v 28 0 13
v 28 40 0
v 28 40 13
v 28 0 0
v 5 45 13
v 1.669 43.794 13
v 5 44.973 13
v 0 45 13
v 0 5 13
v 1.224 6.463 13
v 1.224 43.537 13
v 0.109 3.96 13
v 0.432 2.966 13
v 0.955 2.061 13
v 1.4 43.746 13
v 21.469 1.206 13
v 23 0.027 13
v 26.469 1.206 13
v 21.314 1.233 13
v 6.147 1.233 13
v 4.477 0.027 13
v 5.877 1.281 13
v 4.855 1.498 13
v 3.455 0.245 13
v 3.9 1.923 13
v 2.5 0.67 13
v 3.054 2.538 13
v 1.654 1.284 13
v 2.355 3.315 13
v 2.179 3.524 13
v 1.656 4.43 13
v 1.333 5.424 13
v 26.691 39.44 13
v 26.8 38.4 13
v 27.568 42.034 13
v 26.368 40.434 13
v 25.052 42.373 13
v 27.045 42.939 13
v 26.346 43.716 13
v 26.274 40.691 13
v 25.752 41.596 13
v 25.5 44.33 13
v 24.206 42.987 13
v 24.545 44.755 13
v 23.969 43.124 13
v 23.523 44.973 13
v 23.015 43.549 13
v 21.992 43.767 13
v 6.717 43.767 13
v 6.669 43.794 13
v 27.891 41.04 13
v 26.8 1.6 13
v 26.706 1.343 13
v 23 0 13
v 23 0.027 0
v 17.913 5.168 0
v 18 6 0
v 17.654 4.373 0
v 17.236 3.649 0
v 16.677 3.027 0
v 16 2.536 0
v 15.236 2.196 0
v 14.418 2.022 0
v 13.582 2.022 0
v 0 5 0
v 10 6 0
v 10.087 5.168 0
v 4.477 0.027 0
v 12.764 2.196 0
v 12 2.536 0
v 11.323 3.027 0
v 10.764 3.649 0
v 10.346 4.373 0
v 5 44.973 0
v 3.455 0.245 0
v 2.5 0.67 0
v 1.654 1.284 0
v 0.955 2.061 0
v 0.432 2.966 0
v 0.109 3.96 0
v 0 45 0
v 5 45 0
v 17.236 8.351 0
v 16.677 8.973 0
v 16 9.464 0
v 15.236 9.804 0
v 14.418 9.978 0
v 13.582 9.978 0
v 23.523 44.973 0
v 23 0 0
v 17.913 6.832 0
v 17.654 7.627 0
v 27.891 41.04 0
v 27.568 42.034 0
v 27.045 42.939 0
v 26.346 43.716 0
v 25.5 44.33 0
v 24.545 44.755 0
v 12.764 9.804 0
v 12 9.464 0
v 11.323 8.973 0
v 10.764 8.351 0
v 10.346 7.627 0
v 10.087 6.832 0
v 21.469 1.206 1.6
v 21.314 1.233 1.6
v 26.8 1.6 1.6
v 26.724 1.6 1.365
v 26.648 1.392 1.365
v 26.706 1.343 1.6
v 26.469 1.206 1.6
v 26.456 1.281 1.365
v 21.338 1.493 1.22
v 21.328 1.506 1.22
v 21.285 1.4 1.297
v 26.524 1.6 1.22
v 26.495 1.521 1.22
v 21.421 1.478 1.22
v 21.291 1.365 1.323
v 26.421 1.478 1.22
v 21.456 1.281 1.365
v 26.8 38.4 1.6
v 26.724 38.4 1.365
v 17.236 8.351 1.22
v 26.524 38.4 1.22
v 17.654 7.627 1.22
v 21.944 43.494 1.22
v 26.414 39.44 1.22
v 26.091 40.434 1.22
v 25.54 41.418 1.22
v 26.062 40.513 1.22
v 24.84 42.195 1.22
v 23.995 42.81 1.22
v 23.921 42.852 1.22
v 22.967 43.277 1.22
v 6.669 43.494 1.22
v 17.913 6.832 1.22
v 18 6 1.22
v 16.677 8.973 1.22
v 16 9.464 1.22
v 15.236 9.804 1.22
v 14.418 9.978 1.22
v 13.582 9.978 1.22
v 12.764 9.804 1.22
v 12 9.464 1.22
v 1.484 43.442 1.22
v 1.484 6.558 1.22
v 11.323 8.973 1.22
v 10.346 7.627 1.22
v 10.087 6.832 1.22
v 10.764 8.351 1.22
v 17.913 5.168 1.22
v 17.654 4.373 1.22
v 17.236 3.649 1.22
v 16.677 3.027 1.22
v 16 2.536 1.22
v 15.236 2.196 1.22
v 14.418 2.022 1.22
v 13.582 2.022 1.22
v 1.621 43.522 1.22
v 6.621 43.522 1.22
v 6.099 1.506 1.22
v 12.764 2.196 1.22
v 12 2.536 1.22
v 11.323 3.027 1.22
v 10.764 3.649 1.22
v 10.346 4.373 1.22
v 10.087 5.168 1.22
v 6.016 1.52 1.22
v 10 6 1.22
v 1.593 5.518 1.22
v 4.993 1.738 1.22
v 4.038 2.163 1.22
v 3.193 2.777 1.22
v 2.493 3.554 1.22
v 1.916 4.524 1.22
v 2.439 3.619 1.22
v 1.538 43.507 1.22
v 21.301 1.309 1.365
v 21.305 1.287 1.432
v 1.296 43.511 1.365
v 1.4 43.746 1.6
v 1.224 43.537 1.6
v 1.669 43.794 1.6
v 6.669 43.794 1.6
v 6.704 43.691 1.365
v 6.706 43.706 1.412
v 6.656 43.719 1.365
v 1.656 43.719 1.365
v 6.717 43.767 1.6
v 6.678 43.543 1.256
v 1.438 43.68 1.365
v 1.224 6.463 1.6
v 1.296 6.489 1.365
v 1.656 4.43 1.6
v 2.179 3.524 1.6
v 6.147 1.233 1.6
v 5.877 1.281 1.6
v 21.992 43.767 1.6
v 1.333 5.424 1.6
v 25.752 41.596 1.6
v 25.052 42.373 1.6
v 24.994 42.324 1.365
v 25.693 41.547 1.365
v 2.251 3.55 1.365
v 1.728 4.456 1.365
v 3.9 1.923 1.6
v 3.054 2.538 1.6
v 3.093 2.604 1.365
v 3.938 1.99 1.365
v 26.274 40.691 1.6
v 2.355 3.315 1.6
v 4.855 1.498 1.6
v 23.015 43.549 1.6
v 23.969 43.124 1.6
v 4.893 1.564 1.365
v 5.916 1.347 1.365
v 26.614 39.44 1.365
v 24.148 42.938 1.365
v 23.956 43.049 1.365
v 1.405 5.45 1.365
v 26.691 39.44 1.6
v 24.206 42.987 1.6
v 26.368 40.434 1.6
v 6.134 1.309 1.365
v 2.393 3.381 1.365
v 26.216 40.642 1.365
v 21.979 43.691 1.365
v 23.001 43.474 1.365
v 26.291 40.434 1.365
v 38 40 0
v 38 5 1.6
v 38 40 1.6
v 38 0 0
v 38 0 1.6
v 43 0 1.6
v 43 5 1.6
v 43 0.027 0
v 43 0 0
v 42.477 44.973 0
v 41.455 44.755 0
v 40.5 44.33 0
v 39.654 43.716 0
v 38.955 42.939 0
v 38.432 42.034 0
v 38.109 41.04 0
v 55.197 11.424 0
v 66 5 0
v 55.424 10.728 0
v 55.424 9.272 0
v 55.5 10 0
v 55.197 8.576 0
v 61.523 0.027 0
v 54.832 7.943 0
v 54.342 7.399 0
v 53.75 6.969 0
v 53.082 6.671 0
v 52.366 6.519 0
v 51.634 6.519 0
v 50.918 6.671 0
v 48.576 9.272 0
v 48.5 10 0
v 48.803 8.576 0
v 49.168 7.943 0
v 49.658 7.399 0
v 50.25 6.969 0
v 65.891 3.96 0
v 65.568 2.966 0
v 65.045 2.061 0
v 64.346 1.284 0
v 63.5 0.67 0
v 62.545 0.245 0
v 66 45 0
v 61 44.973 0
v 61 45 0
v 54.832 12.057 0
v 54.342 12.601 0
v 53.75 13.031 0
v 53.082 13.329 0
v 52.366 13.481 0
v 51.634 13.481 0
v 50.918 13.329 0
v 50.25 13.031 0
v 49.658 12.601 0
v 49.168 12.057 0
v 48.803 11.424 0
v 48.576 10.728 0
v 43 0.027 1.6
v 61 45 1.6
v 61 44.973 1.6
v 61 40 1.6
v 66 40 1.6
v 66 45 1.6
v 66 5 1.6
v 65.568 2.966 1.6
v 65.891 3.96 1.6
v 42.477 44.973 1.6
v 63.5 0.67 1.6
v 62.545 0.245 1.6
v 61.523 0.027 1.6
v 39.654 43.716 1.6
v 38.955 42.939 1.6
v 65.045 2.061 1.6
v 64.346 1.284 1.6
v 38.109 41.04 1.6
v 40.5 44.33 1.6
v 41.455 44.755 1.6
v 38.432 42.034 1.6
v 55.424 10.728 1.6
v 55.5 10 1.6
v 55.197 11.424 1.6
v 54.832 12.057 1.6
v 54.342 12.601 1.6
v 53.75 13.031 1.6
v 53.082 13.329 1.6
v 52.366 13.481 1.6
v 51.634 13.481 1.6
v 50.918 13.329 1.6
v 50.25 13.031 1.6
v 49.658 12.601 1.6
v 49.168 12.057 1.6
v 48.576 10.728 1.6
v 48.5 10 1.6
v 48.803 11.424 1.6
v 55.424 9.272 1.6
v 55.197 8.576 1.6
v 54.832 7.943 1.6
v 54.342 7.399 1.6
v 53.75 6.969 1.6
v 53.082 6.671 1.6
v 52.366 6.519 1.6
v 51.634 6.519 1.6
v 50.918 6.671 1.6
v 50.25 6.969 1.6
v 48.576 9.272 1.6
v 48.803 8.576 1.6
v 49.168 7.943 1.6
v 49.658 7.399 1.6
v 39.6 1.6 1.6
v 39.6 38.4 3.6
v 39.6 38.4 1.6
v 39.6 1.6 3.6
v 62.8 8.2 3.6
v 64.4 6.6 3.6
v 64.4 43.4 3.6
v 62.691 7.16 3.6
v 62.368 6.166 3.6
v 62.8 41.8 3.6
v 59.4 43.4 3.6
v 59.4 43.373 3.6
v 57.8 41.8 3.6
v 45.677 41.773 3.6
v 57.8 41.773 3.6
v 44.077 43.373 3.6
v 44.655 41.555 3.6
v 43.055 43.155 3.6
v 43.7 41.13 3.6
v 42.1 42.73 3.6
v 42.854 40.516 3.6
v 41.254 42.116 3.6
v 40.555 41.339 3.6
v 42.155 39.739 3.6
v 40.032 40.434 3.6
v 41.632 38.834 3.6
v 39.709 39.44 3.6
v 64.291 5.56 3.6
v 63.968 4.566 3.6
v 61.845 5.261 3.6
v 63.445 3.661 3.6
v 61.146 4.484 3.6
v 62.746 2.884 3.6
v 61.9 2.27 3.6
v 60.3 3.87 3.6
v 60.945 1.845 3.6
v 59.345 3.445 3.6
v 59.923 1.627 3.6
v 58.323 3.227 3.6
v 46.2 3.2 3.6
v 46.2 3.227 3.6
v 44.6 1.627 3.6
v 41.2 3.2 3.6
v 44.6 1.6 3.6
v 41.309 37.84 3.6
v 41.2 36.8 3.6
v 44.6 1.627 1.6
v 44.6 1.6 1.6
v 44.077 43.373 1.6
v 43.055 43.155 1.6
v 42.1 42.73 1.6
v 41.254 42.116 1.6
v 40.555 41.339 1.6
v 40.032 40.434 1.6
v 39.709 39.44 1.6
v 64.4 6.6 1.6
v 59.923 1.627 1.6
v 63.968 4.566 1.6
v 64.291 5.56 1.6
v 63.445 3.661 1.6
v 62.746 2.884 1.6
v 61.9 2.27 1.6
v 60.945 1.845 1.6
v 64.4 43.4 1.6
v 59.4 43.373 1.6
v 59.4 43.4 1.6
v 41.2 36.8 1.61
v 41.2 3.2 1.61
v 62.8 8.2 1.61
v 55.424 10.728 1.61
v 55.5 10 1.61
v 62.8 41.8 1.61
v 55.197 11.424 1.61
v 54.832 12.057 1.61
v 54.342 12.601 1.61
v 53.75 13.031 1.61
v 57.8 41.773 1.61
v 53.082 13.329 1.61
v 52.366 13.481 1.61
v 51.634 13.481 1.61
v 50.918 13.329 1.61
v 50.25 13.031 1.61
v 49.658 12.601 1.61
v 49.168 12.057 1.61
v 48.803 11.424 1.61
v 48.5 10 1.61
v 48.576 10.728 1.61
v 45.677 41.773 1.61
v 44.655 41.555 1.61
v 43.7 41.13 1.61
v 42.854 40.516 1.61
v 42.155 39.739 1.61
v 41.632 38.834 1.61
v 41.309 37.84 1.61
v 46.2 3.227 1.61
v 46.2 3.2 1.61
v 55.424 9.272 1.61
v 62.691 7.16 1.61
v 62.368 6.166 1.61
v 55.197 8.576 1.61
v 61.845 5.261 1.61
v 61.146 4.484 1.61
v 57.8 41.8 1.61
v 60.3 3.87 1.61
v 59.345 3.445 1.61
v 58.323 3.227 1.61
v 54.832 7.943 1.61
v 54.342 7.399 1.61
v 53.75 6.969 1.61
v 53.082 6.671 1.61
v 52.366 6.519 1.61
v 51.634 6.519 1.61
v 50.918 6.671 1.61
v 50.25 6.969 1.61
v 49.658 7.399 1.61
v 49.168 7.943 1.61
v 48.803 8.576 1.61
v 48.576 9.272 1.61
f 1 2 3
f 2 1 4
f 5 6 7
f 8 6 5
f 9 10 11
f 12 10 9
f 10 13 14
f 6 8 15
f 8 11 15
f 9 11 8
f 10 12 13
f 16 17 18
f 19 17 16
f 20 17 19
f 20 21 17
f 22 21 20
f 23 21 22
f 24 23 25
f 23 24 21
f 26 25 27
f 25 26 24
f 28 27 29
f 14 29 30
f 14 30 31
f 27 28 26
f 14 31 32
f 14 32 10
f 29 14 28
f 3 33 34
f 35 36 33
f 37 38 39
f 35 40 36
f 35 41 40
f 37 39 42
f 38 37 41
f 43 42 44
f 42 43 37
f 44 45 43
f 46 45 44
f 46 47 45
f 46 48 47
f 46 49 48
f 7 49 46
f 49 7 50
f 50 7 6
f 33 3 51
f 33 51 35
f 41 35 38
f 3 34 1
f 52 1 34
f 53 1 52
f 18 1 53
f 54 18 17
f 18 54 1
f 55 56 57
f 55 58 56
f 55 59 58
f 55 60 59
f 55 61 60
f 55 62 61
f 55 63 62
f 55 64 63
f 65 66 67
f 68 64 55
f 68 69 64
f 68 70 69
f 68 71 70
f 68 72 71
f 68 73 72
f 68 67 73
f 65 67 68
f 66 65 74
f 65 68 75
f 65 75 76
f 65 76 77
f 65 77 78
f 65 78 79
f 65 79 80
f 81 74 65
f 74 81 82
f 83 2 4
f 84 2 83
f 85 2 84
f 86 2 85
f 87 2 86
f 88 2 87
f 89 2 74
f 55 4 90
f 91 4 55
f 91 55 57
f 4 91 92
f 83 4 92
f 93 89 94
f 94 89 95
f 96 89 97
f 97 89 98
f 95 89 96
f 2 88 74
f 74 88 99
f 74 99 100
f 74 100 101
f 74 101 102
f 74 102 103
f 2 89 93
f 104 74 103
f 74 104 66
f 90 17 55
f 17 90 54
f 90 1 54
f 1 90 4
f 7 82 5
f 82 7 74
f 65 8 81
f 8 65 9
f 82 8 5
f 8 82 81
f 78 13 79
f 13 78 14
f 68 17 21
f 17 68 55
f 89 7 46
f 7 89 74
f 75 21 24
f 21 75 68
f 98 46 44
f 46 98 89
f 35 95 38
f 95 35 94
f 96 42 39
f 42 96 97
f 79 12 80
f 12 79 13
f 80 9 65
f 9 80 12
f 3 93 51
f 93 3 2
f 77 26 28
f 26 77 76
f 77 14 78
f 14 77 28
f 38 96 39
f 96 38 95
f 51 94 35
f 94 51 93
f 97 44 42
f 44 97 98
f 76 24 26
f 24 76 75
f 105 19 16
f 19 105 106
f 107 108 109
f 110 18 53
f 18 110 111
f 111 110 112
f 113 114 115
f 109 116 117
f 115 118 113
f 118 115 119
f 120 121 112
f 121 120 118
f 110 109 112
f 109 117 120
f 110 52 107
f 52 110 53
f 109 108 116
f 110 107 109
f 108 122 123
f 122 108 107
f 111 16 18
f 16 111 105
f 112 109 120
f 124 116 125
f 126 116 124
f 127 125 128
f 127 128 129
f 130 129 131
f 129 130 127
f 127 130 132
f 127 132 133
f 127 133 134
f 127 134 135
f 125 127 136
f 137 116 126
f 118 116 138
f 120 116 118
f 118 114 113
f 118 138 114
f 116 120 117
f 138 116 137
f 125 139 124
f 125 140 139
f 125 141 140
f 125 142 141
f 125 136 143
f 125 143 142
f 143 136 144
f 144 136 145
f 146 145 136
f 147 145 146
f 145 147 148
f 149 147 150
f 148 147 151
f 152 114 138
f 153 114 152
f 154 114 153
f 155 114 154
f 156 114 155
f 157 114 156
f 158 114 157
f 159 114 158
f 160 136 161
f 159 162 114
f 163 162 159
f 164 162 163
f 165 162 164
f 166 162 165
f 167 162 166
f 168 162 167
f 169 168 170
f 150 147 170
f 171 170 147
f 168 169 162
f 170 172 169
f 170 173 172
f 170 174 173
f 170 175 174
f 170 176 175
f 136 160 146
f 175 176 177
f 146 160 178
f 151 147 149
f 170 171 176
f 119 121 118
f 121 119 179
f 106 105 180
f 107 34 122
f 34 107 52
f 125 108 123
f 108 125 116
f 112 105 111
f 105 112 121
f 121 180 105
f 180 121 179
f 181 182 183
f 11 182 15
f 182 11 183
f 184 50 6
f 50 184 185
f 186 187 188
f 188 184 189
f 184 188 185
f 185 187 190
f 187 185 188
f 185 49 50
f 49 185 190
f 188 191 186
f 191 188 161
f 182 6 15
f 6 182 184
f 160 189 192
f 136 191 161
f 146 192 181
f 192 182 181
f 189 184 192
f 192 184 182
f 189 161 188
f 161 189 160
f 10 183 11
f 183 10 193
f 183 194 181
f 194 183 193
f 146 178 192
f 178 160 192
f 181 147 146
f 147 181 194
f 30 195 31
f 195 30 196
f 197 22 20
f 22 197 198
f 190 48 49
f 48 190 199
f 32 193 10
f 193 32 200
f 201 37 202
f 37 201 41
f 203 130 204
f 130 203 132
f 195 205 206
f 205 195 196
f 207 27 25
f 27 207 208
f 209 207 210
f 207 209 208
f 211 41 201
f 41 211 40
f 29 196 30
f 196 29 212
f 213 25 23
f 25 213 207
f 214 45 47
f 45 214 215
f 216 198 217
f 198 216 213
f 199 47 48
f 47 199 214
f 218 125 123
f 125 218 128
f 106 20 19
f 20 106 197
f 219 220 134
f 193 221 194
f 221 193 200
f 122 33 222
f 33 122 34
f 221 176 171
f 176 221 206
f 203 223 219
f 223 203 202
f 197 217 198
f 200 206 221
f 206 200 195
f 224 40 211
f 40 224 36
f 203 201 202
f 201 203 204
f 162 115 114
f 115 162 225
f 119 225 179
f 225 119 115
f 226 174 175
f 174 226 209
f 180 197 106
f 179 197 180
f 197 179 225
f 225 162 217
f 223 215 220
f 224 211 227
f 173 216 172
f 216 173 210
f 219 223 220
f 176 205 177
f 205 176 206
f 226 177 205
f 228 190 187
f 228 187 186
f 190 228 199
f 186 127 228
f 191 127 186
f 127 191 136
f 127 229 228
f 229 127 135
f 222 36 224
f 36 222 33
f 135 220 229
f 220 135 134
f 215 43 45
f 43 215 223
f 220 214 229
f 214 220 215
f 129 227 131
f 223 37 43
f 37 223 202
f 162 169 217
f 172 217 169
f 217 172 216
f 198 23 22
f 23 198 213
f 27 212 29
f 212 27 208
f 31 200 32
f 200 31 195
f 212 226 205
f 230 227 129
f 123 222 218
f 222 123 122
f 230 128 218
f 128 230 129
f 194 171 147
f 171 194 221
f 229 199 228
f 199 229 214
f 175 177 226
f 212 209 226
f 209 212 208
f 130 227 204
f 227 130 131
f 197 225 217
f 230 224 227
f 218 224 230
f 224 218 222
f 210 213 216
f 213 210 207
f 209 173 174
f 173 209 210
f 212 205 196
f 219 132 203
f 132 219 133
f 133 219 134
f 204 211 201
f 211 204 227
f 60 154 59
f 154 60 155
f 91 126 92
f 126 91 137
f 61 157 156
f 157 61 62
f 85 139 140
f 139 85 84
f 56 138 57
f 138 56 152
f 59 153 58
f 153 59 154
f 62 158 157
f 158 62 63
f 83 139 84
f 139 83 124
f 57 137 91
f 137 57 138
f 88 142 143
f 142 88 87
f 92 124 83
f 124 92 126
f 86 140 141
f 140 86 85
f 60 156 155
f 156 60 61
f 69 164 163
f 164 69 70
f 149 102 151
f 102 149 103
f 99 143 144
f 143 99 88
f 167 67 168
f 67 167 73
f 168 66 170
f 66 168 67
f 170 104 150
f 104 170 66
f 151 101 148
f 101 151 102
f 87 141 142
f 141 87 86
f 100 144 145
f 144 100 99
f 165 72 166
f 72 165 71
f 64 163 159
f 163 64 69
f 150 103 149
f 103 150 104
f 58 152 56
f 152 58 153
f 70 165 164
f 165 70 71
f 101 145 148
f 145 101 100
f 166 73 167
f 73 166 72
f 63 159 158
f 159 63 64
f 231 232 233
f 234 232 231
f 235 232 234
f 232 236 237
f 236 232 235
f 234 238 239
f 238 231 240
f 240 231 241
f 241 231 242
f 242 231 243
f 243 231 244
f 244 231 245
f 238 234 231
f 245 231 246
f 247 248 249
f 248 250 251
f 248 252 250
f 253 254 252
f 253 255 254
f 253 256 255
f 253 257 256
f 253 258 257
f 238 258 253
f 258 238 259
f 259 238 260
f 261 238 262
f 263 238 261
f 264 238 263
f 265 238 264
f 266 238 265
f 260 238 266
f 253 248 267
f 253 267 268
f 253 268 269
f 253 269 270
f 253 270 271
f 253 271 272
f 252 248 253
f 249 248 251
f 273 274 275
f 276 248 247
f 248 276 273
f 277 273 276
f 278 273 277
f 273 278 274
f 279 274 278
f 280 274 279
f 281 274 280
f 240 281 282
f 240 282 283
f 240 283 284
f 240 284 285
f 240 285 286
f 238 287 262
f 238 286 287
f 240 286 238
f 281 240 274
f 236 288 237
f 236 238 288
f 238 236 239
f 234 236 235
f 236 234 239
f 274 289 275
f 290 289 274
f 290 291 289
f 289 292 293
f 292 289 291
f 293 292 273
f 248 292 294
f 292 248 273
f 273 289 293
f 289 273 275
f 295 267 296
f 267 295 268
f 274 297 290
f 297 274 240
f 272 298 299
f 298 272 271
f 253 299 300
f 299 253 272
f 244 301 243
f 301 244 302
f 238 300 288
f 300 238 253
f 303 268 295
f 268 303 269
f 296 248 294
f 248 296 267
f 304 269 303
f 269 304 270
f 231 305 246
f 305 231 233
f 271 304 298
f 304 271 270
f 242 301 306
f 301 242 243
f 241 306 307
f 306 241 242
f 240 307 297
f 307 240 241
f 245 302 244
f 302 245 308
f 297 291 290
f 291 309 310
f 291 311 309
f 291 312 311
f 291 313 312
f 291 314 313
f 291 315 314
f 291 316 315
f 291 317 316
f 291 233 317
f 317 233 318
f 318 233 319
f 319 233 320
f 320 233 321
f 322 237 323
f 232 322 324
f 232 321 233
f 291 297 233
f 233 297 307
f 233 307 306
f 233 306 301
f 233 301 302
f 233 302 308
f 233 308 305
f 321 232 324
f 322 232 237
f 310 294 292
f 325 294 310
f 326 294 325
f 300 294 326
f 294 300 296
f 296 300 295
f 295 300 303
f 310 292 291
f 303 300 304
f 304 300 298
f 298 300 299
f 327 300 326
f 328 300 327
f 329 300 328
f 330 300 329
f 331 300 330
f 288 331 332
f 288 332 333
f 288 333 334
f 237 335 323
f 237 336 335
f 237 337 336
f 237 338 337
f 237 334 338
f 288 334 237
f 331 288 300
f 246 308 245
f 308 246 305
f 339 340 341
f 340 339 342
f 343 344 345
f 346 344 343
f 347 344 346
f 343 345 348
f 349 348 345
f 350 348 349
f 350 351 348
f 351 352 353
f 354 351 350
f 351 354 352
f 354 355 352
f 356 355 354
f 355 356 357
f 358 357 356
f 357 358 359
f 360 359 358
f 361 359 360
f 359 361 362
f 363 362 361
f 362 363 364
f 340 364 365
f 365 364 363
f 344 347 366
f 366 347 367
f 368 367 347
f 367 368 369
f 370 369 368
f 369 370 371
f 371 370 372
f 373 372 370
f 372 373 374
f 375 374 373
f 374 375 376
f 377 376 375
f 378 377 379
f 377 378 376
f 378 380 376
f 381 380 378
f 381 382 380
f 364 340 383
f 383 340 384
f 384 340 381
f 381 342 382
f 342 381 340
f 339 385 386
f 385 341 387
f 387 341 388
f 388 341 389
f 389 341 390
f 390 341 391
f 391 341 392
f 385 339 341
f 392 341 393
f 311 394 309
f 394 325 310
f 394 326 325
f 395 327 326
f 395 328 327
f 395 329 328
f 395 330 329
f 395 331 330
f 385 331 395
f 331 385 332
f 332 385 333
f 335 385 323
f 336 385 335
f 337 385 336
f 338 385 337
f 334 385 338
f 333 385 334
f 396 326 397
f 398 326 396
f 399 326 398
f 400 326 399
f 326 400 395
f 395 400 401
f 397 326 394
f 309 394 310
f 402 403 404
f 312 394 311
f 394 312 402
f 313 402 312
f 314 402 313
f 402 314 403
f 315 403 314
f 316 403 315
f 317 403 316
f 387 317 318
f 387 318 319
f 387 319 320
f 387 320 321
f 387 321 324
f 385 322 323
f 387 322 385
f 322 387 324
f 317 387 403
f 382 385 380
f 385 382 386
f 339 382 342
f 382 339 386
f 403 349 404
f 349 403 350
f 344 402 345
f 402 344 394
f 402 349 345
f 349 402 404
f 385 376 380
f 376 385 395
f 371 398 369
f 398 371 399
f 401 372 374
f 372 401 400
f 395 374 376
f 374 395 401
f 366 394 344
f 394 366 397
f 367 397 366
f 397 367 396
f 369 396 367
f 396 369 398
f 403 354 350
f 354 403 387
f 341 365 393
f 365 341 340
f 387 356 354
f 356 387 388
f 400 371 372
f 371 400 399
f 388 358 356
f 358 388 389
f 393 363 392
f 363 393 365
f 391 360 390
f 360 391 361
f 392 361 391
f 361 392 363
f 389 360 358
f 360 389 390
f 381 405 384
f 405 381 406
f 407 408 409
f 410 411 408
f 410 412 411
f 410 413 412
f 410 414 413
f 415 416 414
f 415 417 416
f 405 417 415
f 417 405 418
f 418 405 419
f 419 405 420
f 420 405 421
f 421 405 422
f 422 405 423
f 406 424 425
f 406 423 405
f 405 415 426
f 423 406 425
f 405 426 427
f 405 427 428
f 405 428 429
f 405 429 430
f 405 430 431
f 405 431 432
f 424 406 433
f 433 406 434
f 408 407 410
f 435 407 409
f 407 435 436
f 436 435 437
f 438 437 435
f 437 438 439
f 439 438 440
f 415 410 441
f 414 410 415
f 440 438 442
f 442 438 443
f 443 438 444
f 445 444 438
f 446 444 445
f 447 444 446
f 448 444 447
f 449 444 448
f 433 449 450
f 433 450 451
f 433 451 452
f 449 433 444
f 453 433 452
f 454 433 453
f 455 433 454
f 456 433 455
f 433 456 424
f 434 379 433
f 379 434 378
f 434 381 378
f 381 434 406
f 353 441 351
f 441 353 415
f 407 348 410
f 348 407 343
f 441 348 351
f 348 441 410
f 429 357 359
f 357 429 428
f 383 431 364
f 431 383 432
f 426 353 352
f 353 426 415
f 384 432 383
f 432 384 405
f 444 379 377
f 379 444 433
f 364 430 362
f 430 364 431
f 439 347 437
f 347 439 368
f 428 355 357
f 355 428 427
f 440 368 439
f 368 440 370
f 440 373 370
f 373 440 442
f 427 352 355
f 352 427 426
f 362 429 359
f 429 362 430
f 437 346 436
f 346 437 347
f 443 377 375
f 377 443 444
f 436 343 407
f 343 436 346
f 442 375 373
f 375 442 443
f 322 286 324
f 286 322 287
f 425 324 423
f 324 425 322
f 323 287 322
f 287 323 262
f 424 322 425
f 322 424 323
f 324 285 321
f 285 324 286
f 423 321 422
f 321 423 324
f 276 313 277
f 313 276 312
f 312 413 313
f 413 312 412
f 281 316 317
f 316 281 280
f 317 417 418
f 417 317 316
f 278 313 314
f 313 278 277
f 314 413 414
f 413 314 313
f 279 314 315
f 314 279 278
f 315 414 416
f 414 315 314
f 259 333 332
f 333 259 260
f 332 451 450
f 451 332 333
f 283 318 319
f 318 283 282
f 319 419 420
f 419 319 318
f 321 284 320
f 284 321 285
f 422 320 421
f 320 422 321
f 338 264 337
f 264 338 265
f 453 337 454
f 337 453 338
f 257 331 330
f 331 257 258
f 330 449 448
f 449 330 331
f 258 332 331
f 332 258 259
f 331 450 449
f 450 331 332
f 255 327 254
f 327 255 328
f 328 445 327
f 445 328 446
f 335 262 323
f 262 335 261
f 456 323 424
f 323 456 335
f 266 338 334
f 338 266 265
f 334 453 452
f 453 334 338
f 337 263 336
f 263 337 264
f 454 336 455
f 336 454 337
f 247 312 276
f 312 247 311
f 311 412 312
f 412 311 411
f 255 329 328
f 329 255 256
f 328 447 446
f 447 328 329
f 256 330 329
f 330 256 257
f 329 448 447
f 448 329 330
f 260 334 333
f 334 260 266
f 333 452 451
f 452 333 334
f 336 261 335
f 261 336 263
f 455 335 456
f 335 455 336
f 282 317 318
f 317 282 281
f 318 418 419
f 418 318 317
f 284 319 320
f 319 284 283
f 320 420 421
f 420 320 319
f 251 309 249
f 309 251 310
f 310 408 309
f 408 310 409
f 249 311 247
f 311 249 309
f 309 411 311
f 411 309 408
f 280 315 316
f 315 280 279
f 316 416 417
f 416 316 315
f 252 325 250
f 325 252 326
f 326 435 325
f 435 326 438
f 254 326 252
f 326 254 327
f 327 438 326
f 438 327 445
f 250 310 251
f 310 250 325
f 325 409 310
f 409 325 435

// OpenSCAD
// Fully parametric box for 3D printing
// v4b
// http://www.thingiverse.com/thing:1918169
//
// Original box based on:
// http://tinyurl.com/oznh2p4
//
// Ventilation holes based on:
// http://www.thingiverse.com/thing:1826360

// Configure below
//
/* [Box parameters] */
// Length of box in mm
length = 45;   //[10:254]
// Width of box in mm
width = 28;    //[10:254]
// Height of box in mm
tall = 13;      //[10:254]
// Wall thickness of box in mm
thick = 1.6;      //[1:15]
// Depth of lip on lid in mm
lDepth = 2;     //[1:15]
// Corner radius; 0 = four square corners
cRadius = 5;   //[0:25]   
// Fancy: Square two opposing corners; 0=no, 1=yes (must be using cRadius)
sqCorners = 1;  //[0,1]

/* [Vent Parameters] */
// Vent hole size in mm; 0 = no vents
hSize = 0;      //[0:15]
// Hole Spacing in mm; must be > 0
hSpace = 1;     //[1:15]
// Vent hole type; 0=round, 1=square
hType = 0;      //[0,1]
//
// Configure above

/* [Hidden] */
//fn=200;            // 40 fragments per cicle; comment for draft mode
//$fn=60;
$fs=0.3;
fuz=0.1; fuzz=2*fuz;

// Draw Box
module post() {
/*     difference() {
	  cylinder(d=6, h=6);
	  cylinder(d=2, h=6.5);
     }
*/
     cylinder(d=5,h=1.2);
     cylinder(d=2.4, h=3);
}

module box() {
    translate([cRadius, cRadius, 0]){
	// Create a hollow box
	difference() {	
	    // Create box shape
	    roundedBox(length,width,tall,cRadius,sqCorners); 
	    // Create negative box shape, smaller by wall thickness plus clearance
	    translate([thick,thick,thick]) { 
		minkowski() { roundedBox(length-(thick*2),width-(thick*2),tall,cRadius,sqCorners);
		    sphere(r=0.4);
		}
		
		// Add vent holes to long sides
		gutterSpace=max(floor(tall*.2),thick*2,cRadius+hSize);
		if (hSize>0) addVentHoles(
		    length,     				// Panel Width
		    tall,						// Panel Height
		    gutterSpace,                // Gutter Width
		    gutterSpace,                // Gutter Height
		    hSize,						// Hole Radius
		    hSpace,					    // Hole Spacing
		    width+0.02,					// Hole Length
		    -(cRadius)-(thick+0.01),	// X Location
		    -gutterSpace,	            // Y Location
		    hType						// Hole Type
		    );
	    }
	    // cut openings in box	
	    //translate([(width-12)/2-cRadius,-cRadius-0.1,thick+2]) cube([12,10,6]);
	    translate([width/2-cRadius,6-cRadius,-fuz]) cylinder(d=8,h=5);
	    
	}
    }
    // Add mounting posts inside box
    //translate([(width-9)/2, 10, thick]) post();
    //translate([(width+9)/2, 10, thick]) post();
}
box();

module lid() {
// Draw Box Lid
// Shift along-side first box
    translate([(width*2)+(10-cRadius), cRadius, 0]) {
	mirror([1,0,0]) {
	    difference() {
		union() {
		    // Create lid
		    roundedBox(length,width,thick,cRadius,sqCorners);
		    // Create lip on top of lid
		    difference() {
			// Create lip shape
			translate([thick,thick,thick]) {
			    roundedBox(length-(thick*2),width-(thick*2),lDepth,cRadius,sqCorners);}
                        // Create negative shape, smaller by wall thickness
                        // (add 0.01 to depth to bypass rendering bug)
                        translate([(thick*2),(thick*2),thick+0.01]) {
                            roundedBox(length-(thick*4),width-(thick*4),lDepth,cRadius,sqCorners);}    
		    }
		}

		// Cut holes in lid
		//translate([width/2-cRadius,length/2-cRadius,thick/2]) cube([15,24,4*thick],center=true);
        	    translate([width/2-cRadius,10-cRadius,-fuz]) cylinder(d=7,h=5);

            }
	}
    }
}

lid();

// Render box according to parameters
module roundedBox(length, width, tall, radius, sqCorners)
{
	if (radius==0) {
		// Draw regular cube
		cube(size=[width,length,tall]);
	} else {
		// Draw rounded corner cube
		diam=2*radius;

		// Draw base rounded shape
		minkowski() {
			cube(size=[width-diam,length-diam, tall/2]);
			cylinder(r=radius, h=tall/2);
		}

        // Square opposing corners
		if (sqCorners==1) {
			// Corner cube bottom right
			translate([width-diam,-radius,0]) {cube(size=[radius,radius,tall]);}

			// Corner cube top left
			translate([-radius,length-diam,0]) {cube(size=[radius,radius,tall]);}  
		}
	}
}

// Ventillate opposing panels Y-axis panels
module addVentHoles (pWidth, pHeight, gWidth, gHeight, hSize, hSpace, hLength, xLoc, yLoc, hType) {
	hSpacing = hSpace + hSize;
    mainRowHoles = floor((pWidth - (2 * gWidth)) / hSpacing);
    rows = floor((pHeight - (2 * gHeight)) / hSpacing);

    for (n = [0:rows]) {
        for (i = [0:mainRowHoles]) {
            // If we're on an even-number row, then we put holes across the panel
            if (n % 2 == 0)
                translate([
					xLoc,
					yLoc+(i*hSpacing)+(gWidth),
					(n*hSpacing)+gHeight])
					
					rotate([0,90,0])
                    // Choose square or round hole
					if (hType==0) {
						cylinder(h=hLength, r=hSize/2);
					} else {
						translate([0,0,hLength/2]) cube(size=[hSize,hSize,hLength], center=true);
					}	

            // If we're on an odd-number row then we offset the holes, and drop one
            if ((n % 2 == 1) && (i<mainRowHoles)) // This drops the hole
				translate([
					xLoc,
					yLoc+(i*hSpacing)+(gWidth)+(hSpacing/2),
					(n*hSpacing)+gHeight]) 
					
					rotate([0,90,0])
					// Choose square or round hole
					if (hType==0) {				 
						cylinder(h=hLength, r=hSize/2);
					} else {
						translate([0,0,hLength/2]) cube(size=[hSize,hSize,hLength], center=true);
					}	
        }
    }
}
